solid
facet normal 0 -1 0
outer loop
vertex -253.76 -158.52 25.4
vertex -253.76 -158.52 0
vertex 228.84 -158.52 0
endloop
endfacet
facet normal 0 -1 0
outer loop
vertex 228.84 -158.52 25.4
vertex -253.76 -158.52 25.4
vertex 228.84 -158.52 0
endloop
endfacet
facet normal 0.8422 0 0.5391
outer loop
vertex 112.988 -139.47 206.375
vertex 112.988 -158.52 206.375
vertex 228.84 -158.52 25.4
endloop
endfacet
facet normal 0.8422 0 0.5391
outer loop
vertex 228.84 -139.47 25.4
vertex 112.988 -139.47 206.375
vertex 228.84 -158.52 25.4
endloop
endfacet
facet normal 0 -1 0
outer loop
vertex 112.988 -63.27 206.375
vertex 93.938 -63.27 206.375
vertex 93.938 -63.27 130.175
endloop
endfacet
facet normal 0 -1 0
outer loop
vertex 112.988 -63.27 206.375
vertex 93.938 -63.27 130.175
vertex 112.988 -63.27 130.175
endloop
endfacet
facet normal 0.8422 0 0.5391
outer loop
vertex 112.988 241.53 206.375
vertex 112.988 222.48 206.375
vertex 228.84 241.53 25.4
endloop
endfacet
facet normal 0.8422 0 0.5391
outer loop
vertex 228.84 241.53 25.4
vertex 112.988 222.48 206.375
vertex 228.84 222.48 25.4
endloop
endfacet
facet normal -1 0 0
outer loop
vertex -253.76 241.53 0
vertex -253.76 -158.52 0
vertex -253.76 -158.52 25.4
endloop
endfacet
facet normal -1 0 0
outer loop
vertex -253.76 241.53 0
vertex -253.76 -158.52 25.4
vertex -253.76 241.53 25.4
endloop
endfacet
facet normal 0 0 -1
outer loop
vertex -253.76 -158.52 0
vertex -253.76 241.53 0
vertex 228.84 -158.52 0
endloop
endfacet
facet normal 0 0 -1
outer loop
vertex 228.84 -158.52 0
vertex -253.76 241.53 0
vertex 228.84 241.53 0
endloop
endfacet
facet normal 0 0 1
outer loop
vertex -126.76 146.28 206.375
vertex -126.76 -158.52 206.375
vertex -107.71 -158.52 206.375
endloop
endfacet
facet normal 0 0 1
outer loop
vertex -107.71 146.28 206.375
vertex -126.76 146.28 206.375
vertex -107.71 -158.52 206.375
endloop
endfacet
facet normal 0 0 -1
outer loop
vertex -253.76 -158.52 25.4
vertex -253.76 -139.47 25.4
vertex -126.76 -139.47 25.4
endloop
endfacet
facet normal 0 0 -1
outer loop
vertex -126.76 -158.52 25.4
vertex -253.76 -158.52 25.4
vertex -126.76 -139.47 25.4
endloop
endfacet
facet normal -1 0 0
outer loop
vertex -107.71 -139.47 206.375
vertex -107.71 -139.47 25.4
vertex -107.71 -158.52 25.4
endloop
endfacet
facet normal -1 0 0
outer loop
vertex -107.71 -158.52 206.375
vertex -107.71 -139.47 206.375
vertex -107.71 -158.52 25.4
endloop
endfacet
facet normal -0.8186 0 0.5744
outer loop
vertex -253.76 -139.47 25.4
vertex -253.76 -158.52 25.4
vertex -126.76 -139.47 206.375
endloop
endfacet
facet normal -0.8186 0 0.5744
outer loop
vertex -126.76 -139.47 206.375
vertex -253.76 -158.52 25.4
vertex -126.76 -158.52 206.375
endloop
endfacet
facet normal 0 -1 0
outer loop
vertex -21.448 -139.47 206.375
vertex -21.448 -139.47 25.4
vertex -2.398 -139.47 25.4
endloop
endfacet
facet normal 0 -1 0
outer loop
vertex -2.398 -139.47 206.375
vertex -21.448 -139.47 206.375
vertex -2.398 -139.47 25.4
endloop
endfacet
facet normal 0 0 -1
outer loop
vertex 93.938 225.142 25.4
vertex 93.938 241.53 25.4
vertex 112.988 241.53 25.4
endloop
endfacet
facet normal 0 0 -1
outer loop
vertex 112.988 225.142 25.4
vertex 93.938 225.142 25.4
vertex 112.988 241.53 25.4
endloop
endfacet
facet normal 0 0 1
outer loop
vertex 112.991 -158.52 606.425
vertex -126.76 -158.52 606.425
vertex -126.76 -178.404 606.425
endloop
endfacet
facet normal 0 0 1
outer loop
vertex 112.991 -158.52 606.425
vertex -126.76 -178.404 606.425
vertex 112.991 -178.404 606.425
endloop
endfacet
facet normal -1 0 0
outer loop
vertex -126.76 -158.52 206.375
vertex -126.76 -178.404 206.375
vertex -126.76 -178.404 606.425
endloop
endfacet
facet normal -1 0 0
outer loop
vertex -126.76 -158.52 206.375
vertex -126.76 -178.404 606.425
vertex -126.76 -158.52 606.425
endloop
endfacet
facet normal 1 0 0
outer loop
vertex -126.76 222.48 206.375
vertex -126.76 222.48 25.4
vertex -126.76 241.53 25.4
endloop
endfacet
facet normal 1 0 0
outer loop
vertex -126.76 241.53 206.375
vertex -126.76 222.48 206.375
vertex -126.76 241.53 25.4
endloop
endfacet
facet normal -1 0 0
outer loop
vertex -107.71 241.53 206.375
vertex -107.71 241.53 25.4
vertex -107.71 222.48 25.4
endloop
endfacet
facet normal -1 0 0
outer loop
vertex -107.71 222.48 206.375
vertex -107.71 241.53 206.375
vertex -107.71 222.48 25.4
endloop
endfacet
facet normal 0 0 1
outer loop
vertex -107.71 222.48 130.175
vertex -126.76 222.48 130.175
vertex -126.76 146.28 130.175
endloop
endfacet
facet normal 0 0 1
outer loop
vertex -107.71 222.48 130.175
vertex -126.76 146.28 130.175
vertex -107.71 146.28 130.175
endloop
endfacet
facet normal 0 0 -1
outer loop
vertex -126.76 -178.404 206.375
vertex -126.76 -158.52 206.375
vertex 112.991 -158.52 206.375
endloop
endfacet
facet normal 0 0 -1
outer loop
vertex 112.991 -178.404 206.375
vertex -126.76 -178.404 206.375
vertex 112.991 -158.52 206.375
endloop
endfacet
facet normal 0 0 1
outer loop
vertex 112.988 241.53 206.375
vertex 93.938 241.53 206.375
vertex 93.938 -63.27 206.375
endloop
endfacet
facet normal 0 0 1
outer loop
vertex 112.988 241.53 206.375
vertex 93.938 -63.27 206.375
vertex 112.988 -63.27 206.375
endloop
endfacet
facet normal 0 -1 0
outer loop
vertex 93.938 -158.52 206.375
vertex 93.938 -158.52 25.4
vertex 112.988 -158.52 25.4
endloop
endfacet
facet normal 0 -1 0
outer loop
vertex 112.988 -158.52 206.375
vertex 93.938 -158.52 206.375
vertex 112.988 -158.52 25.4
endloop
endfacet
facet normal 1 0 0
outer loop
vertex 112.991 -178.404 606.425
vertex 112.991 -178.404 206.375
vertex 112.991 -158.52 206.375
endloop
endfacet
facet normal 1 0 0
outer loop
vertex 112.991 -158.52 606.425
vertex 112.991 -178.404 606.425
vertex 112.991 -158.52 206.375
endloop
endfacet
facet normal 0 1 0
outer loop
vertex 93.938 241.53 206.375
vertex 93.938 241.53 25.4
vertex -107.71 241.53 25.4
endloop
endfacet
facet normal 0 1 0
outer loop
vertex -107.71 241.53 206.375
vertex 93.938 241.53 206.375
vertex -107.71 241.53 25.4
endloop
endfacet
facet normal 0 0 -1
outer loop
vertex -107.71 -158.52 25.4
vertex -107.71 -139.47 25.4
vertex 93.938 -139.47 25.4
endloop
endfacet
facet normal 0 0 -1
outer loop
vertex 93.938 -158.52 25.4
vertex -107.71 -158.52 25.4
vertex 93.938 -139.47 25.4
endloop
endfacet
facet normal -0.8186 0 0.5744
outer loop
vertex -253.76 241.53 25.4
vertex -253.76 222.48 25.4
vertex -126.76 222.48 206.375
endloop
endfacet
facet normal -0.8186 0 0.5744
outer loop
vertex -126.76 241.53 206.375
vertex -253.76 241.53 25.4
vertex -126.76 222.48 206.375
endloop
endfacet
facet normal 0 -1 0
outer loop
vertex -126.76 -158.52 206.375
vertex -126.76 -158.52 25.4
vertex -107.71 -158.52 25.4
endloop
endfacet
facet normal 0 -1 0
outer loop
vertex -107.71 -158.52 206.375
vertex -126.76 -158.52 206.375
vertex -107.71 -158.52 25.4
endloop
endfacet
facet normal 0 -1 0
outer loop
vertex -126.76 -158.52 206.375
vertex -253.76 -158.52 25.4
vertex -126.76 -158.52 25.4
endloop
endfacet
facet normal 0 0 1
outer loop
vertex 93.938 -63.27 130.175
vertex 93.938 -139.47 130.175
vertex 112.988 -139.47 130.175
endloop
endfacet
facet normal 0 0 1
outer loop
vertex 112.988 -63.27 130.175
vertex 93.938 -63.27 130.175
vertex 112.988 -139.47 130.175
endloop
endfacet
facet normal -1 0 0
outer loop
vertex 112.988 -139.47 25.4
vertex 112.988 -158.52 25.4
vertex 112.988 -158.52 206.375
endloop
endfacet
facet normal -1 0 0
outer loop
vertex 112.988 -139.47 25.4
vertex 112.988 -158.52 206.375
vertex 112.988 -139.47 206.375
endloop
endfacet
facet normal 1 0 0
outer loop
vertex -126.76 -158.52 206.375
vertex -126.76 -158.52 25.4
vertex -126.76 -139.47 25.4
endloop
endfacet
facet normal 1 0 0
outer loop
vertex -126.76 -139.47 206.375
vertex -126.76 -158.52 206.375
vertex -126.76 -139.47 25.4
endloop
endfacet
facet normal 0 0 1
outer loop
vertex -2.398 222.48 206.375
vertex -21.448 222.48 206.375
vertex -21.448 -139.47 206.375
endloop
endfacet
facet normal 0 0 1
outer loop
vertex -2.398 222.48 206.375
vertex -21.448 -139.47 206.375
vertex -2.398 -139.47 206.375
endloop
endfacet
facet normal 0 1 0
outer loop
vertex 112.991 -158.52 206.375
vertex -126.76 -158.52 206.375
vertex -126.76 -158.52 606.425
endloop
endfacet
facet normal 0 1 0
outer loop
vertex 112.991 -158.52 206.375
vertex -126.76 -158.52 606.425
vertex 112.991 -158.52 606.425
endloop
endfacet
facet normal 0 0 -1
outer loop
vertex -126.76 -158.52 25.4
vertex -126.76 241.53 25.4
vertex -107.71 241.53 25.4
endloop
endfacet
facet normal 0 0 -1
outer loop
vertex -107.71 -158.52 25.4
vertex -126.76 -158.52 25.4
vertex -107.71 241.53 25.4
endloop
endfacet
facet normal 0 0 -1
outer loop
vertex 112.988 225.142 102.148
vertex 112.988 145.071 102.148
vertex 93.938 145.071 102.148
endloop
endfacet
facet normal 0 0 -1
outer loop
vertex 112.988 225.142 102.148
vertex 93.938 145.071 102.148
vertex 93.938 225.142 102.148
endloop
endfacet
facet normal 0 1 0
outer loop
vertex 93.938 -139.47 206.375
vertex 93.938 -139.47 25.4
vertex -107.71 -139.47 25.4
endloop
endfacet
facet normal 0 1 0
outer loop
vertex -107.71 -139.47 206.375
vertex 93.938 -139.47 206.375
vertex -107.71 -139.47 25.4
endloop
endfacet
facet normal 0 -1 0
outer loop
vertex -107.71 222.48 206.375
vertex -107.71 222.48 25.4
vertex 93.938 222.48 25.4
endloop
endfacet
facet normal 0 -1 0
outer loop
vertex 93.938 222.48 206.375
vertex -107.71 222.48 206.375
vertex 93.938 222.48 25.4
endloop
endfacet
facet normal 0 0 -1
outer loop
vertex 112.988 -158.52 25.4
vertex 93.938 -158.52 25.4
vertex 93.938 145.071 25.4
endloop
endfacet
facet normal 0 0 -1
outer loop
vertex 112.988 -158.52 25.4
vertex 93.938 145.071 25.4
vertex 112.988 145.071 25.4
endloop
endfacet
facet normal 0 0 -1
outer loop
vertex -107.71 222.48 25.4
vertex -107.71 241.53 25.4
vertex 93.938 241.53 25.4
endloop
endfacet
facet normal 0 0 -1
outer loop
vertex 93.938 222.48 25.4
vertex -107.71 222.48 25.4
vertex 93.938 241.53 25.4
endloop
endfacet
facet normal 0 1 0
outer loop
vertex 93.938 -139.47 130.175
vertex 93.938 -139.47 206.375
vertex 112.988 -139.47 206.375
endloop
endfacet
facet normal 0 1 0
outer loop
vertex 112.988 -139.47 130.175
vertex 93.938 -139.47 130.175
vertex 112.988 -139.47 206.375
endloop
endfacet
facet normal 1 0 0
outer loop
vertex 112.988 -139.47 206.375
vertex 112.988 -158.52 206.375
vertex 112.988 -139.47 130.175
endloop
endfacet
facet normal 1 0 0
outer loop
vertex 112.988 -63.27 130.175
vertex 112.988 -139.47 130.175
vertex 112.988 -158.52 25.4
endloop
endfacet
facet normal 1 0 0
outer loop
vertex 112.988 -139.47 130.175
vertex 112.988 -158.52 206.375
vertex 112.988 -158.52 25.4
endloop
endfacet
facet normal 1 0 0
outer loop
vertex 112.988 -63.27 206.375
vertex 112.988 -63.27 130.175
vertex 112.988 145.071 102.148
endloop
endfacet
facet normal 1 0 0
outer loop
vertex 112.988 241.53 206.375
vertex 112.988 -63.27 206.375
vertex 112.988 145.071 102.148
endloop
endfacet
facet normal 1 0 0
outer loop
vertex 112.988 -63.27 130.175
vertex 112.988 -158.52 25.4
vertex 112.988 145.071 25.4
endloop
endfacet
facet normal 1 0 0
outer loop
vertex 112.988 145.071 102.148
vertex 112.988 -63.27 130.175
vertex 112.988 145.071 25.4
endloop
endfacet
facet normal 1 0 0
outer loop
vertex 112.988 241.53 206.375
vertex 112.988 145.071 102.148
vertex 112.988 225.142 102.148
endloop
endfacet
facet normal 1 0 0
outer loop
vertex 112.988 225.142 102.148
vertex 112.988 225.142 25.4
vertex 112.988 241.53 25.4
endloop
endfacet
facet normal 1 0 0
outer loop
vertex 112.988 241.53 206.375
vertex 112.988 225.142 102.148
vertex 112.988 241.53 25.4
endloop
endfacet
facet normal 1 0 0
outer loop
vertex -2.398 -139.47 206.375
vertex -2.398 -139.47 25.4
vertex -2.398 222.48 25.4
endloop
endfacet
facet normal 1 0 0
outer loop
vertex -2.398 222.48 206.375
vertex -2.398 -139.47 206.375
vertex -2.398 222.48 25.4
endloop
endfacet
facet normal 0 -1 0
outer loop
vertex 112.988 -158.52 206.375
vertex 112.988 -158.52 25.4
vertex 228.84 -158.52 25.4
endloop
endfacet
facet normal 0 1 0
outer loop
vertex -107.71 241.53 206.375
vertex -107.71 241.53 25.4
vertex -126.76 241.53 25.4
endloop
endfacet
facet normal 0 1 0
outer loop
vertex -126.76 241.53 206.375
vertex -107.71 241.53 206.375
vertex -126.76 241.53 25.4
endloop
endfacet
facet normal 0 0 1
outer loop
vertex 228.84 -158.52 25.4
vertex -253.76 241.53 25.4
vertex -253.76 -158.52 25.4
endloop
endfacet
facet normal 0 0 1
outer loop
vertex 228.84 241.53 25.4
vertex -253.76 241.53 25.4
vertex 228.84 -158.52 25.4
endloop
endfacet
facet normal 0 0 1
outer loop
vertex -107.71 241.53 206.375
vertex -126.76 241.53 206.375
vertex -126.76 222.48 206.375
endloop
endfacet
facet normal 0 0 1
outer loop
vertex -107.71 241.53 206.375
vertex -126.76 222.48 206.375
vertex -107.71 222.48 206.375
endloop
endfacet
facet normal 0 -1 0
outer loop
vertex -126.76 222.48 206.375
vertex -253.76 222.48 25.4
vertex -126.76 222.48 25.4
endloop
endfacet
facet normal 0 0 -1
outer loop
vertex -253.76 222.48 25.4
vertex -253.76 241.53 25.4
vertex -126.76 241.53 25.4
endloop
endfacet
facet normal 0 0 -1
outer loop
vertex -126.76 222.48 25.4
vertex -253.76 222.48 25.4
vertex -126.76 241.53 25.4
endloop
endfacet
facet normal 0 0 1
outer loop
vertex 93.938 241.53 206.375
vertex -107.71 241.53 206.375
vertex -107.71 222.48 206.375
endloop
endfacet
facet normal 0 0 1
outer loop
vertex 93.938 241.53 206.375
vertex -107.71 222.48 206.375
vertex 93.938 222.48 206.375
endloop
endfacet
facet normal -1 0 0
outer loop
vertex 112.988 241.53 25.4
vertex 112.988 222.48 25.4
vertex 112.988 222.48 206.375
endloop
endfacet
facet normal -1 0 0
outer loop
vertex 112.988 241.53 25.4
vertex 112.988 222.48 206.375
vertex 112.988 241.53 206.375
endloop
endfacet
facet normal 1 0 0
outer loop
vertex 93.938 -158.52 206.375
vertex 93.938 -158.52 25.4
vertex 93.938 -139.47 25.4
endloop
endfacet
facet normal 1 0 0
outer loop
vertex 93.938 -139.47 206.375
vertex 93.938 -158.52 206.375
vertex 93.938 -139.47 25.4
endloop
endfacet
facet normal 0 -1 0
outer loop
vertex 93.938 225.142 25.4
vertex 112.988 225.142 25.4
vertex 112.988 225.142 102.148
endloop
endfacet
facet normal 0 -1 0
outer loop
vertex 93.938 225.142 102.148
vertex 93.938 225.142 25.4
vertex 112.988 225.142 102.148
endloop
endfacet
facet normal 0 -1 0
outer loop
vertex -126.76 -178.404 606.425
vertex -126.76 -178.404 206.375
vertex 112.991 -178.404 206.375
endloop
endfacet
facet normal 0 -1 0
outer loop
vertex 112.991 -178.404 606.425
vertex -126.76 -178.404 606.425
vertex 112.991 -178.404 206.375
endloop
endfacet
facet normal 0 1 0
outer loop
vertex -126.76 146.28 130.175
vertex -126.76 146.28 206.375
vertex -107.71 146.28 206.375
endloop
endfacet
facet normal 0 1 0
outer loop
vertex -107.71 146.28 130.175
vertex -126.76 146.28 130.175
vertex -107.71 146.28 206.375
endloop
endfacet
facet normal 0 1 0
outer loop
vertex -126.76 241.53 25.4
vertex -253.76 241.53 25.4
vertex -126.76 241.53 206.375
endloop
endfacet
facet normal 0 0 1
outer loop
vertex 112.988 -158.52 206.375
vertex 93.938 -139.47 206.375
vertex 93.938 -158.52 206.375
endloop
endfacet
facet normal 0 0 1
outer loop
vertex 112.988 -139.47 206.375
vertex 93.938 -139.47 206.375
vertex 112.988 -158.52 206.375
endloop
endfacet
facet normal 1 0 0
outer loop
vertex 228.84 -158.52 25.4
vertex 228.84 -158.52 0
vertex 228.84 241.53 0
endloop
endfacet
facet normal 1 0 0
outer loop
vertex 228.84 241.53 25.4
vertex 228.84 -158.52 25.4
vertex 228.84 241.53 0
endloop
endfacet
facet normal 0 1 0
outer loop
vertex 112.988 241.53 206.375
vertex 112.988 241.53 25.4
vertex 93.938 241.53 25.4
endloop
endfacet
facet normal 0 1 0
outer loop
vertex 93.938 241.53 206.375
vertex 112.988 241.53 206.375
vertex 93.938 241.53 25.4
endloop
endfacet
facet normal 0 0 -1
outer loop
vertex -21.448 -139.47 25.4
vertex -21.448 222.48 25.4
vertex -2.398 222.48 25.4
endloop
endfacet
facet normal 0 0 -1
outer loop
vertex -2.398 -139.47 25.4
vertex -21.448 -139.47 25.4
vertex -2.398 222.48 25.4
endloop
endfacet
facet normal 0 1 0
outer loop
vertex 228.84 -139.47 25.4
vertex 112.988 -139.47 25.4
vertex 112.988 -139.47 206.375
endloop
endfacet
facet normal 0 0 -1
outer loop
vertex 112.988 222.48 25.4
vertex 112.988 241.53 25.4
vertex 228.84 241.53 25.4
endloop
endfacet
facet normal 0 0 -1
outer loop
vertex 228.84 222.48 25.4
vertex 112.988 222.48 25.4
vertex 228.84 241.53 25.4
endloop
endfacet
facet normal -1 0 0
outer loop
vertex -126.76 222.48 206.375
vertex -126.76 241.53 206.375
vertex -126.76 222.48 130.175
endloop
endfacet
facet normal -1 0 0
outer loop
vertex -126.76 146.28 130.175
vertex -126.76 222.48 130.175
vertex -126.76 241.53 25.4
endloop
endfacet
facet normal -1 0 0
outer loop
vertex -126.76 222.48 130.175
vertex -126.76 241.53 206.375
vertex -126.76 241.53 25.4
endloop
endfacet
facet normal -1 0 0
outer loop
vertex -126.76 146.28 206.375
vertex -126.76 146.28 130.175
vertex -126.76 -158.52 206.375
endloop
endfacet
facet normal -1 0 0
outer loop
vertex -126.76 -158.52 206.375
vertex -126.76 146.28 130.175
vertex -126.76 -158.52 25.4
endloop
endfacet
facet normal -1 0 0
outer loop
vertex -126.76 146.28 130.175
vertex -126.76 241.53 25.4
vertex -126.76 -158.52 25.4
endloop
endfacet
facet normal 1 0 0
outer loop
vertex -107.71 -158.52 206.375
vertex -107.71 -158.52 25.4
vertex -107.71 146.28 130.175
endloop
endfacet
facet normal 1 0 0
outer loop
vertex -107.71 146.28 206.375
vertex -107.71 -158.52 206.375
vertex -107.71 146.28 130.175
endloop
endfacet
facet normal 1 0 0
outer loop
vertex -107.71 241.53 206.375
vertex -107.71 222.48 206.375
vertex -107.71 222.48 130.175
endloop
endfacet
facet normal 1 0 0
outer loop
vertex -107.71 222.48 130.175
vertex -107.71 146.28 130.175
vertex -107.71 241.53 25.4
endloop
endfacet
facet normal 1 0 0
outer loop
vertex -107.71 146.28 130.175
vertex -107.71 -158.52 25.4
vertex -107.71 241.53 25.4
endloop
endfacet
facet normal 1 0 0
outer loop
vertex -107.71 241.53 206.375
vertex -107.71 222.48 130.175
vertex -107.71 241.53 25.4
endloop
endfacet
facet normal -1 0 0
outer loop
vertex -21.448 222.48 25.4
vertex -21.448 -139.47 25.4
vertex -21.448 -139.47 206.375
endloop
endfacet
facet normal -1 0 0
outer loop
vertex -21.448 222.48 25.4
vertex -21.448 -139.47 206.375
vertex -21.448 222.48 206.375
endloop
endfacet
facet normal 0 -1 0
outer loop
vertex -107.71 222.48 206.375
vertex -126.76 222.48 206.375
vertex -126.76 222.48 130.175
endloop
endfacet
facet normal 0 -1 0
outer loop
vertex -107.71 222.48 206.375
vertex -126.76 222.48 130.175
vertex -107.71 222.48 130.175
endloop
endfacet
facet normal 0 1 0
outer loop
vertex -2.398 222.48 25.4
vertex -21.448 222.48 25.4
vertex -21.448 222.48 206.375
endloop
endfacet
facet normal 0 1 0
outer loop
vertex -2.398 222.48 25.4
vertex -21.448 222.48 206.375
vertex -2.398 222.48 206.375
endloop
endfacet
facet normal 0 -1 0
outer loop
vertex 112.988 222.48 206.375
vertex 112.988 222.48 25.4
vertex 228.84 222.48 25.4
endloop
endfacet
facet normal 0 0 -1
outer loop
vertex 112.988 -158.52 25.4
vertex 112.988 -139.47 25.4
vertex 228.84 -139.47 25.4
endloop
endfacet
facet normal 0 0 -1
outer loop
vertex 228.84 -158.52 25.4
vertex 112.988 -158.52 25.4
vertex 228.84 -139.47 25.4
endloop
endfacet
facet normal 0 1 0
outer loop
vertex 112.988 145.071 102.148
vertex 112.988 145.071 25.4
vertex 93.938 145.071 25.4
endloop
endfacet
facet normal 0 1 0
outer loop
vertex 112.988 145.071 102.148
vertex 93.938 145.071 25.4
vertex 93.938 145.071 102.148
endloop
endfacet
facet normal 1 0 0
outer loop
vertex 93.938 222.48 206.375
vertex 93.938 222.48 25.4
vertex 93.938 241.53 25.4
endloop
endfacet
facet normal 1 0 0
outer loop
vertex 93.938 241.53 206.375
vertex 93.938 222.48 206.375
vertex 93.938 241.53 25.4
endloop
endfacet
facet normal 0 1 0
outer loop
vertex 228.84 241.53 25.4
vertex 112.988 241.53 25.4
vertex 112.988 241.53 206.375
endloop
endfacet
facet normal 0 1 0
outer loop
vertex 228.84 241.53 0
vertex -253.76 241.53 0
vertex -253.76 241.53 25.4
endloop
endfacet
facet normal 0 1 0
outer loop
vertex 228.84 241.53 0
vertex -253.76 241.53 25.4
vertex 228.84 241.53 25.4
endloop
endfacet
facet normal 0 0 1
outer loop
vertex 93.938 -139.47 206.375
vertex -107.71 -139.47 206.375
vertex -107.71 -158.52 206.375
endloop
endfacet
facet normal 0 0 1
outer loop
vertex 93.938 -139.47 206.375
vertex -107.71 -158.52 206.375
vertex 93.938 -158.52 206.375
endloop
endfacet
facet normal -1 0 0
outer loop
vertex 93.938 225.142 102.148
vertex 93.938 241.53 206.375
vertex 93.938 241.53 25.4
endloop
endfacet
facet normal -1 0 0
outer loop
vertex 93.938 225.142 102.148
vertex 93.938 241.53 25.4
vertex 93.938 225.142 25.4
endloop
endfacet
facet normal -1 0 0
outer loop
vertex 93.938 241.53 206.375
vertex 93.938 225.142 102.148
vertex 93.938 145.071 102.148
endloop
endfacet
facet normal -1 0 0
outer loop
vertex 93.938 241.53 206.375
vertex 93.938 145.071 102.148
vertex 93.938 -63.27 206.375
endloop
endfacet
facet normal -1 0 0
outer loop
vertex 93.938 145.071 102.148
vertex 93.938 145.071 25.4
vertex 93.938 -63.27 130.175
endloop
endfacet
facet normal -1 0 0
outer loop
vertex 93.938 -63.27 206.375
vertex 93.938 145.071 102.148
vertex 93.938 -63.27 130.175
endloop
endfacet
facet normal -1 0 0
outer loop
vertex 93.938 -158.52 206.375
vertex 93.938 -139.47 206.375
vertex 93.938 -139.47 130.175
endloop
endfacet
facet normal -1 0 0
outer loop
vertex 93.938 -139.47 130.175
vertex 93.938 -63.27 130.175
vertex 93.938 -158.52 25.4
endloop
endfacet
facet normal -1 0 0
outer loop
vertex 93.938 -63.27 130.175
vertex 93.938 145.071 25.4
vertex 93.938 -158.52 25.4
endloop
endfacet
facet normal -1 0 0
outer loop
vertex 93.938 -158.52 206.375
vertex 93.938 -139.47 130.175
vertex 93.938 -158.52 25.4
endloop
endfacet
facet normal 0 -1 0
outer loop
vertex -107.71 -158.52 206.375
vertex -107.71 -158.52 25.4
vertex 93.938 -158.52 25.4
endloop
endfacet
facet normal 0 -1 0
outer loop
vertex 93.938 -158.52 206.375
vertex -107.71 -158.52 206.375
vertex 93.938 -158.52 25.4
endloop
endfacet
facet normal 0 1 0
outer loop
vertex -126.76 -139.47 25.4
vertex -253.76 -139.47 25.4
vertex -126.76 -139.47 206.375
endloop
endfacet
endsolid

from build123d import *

# Parameters (mm, degrees)
F0_W      = 482.6
F0_H      = 400.05
F1_DEPTH  = 25.4
F3_DEPTH  = 180.975
F2_W      = 19.05
F2_H      = 361.95
F2_W_2    = 127
F2_H_2    = 19.05
F4_DEPTH  = 180.975
F2_W_3    = 115.852443859
F6_DEPTH  = 400.051
F8_DEPTH  = 400.051
F9_W      = 239.7506
F9_H      = 19.883907908
F10_DEPTH = 400.05
F11_W     = 19.05
F11_H     = 76.2
F12_DEPTH = 76.2
F13_W     = 80.0712406635
F13_H     = 76.7482050419
F14_DEPTH = 25.4
F15_W     = 25.4
F15_H     = 76.2
F16_DEPTH = 76.2


with BuildPart() as f1:
    # F0 (on Top) → F1 (new body)
    with BuildSketch(Plane.XY):
        with Locations((-12.459570542, 41.5053624034)):
            Rectangle(F0_W, F0_H)
    extrude(amount=F1_DEPTH)


with BuildPart() as f3:
    # F2 (on face) → F3 (new body)
    with BuildSketch(Plane.XY.offset(25.4)):
        Polygon((-107.709570542, 241.5303624034), (-126.759570542, 241.5303624034), (-126.759570542, 222.4803624034), (-126.759570542, -139.4696375966), (-126.759570542, -158.5196375966), (-107.709570542, -158.5196375966), (-107.709570542, -139.4696375966), (-107.709570542, 222.4803624034), align=None)
    extrude(amount=F3_DEPTH)

    # F15 (on face) → F16 (cut)
    with BuildSketch(Plane.XY.offset(206.375)):
        with Locations((-120.409570542, 184.3803624034)):
            Rectangle(F15_W, F15_H)
    extrude(amount=-F16_DEPTH, mode=Mode.SUBTRACT)


with BuildPart() as f3b:
    # F2 (on face) → F3, piece 2 (new body)
    with BuildSketch(Plane.XY.offset(25.4)):
        with Locations((-11.9229956776, 41.5053624034)):
            Rectangle(F2_W, F2_H)
    extrude(amount=F3_DEPTH)


with BuildPart() as f3c:
    # F2 (on face) → F3, piece 3 (new body)
    with BuildSketch(Plane.XY.offset(25.4)):
        Polygon((112.987985599, 241.5303624034), (93.937985599, 241.5303624034), (93.937985599, 222.4803624034), (93.937985599, -139.4696375966), (93.937985599, -158.5196375966), (112.987985599, -158.5196375966), (112.987985599, -139.4696375966), (112.987985599, 222.4803624034), align=None)
    extrude(amount=F3_DEPTH)

    # F11 (on face) → F12 (cut)
    with BuildSketch(Plane.XY.offset(206.375)):
        with Locations((103.462985599, -101.3696375966)):
            Rectangle(F11_W, F11_H)
    extrude(amount=-F12_DEPTH, mode=Mode.SUBTRACT)

    # F13 (on face) → F14 (cut)
    with BuildSketch(Plane.YZ.offset(112.987985599)):
        with Locations((185.106664896, 63.7741025209)):
            Rectangle(F13_W, F13_H)
    extrude(amount=-F14_DEPTH, mode=Mode.SUBTRACT)


with BuildPart() as f4:
    # F2 (on face) → F4 (new body)
    with BuildSketch(Plane.XY.offset(25.4)):
        with Locations((-190.259570542, -148.9946375966)):
            Rectangle(F2_W_2, F2_H_2)
    extrude(amount=F4_DEPTH)


with BuildPart() as f4b:
    # F2 (on face) → F4, piece 2 (new body)
    with BuildSketch(Plane.XY.offset(25.4)):
        Polygon((-21.4479956776, -139.4696375966), (-107.709570542, -139.4696375966), (-107.709570542, -158.5196375966), (93.937985599, -158.5196375966), (93.937985599, -139.4696375966), (-2.3979956776, -139.4696375966), align=None)
    extrude(amount=F4_DEPTH)


with BuildPart() as f4c:
    # F2 (on face) → F4, piece 3 (new body)
    with BuildSketch(Plane.XY.offset(25.4)):
        with Locations((170.9142075285, -148.9946375966)):
            Rectangle(F2_W_3, F2_H_2)
    extrude(amount=F4_DEPTH)


with BuildPart() as f4d:
    # F2 (on face) → F4, piece 4 (new body)
    with BuildSketch(Plane.XY.offset(25.4)):
        Polygon((93.937985599, 241.5303624034), (-107.709570542, 241.5303624034), (-107.709570542, 222.4803624034), (-21.4479956776, 222.4803624034), (-2.3979956776, 222.4803624034), (93.937985599, 222.4803624034), align=None)
    extrude(amount=F4_DEPTH)


with BuildPart() as f4e:
    # F2 (on face) → F4, piece 5 (new body)
    with BuildSketch(Plane.XY.offset(25.4)):
        with Locations((170.9142075285, 232.0053624034)):
            Rectangle(F2_W_3, F2_H_2)
    extrude(amount=F4_DEPTH)


with BuildPart() as f4f:
    # F2 (on face) → F4, piece 6 (new body)
    with BuildSketch(Plane.XY.offset(25.4)):
        with Locations((-190.259570542, 232.0053624034)):
            Rectangle(F2_W_2, F2_H_2)
    extrude(amount=F4_DEPTH)


with BuildPart() as f6_tool:
    # F5 (on face) → F6 (new body, through all)
    with BuildSketch(Plane.XZ.offset(158.5196375966)):
        Polygon((-253.759570542, 206.375), (-253.759570542, 25.4), (-126.759570542, 206.375), align=None)
    extrude(amount=-F6_DEPTH)


with BuildPart() as f4_1:
    add(f4.part)

    # F6: cut by f6_tool
    add(f6_tool.part, mode=Mode.SUBTRACT)


with BuildPart() as f4f_1:
    add(f4f.part)

    # F6: cut by f6_tool
    add(f6_tool.part, mode=Mode.SUBTRACT)


with BuildPart() as f8_tool:
    # F7 (on face) → F8 (new body, through all)
    with BuildSketch(Plane.XZ.offset(158.5196375966)):
        Polygon((112.987985599, 206.375), (228.840429458, 25.4), (228.840429458, 206.375), align=None)
    extrude(amount=-F8_DEPTH)


with BuildPart() as f4c_1:
    add(f4c.part)

    # F8: cut by f8_tool
    add(f8_tool.part, mode=Mode.SUBTRACT)


with BuildPart() as f4e_1:
    add(f4e.part)

    # F8: cut by f8_tool
    add(f8_tool.part, mode=Mode.SUBTRACT)


with BuildPart() as f10:
    # F9 (on face) → F10 (new body)
    with BuildSketch(Plane.XY.offset(206.375)):
        with Locations((-6.884270542, -168.4615915506)):
            Rectangle(F9_W, F9_H)
    extrude(amount=F10_DEPTH)


solid = Compound([f1.part, f3.part, f3b.part, f3c.part, f4b.part, f4d.part, f4_1.part, f4f_1.part, f4c_1.part, f4e_1.part, f10.part])
